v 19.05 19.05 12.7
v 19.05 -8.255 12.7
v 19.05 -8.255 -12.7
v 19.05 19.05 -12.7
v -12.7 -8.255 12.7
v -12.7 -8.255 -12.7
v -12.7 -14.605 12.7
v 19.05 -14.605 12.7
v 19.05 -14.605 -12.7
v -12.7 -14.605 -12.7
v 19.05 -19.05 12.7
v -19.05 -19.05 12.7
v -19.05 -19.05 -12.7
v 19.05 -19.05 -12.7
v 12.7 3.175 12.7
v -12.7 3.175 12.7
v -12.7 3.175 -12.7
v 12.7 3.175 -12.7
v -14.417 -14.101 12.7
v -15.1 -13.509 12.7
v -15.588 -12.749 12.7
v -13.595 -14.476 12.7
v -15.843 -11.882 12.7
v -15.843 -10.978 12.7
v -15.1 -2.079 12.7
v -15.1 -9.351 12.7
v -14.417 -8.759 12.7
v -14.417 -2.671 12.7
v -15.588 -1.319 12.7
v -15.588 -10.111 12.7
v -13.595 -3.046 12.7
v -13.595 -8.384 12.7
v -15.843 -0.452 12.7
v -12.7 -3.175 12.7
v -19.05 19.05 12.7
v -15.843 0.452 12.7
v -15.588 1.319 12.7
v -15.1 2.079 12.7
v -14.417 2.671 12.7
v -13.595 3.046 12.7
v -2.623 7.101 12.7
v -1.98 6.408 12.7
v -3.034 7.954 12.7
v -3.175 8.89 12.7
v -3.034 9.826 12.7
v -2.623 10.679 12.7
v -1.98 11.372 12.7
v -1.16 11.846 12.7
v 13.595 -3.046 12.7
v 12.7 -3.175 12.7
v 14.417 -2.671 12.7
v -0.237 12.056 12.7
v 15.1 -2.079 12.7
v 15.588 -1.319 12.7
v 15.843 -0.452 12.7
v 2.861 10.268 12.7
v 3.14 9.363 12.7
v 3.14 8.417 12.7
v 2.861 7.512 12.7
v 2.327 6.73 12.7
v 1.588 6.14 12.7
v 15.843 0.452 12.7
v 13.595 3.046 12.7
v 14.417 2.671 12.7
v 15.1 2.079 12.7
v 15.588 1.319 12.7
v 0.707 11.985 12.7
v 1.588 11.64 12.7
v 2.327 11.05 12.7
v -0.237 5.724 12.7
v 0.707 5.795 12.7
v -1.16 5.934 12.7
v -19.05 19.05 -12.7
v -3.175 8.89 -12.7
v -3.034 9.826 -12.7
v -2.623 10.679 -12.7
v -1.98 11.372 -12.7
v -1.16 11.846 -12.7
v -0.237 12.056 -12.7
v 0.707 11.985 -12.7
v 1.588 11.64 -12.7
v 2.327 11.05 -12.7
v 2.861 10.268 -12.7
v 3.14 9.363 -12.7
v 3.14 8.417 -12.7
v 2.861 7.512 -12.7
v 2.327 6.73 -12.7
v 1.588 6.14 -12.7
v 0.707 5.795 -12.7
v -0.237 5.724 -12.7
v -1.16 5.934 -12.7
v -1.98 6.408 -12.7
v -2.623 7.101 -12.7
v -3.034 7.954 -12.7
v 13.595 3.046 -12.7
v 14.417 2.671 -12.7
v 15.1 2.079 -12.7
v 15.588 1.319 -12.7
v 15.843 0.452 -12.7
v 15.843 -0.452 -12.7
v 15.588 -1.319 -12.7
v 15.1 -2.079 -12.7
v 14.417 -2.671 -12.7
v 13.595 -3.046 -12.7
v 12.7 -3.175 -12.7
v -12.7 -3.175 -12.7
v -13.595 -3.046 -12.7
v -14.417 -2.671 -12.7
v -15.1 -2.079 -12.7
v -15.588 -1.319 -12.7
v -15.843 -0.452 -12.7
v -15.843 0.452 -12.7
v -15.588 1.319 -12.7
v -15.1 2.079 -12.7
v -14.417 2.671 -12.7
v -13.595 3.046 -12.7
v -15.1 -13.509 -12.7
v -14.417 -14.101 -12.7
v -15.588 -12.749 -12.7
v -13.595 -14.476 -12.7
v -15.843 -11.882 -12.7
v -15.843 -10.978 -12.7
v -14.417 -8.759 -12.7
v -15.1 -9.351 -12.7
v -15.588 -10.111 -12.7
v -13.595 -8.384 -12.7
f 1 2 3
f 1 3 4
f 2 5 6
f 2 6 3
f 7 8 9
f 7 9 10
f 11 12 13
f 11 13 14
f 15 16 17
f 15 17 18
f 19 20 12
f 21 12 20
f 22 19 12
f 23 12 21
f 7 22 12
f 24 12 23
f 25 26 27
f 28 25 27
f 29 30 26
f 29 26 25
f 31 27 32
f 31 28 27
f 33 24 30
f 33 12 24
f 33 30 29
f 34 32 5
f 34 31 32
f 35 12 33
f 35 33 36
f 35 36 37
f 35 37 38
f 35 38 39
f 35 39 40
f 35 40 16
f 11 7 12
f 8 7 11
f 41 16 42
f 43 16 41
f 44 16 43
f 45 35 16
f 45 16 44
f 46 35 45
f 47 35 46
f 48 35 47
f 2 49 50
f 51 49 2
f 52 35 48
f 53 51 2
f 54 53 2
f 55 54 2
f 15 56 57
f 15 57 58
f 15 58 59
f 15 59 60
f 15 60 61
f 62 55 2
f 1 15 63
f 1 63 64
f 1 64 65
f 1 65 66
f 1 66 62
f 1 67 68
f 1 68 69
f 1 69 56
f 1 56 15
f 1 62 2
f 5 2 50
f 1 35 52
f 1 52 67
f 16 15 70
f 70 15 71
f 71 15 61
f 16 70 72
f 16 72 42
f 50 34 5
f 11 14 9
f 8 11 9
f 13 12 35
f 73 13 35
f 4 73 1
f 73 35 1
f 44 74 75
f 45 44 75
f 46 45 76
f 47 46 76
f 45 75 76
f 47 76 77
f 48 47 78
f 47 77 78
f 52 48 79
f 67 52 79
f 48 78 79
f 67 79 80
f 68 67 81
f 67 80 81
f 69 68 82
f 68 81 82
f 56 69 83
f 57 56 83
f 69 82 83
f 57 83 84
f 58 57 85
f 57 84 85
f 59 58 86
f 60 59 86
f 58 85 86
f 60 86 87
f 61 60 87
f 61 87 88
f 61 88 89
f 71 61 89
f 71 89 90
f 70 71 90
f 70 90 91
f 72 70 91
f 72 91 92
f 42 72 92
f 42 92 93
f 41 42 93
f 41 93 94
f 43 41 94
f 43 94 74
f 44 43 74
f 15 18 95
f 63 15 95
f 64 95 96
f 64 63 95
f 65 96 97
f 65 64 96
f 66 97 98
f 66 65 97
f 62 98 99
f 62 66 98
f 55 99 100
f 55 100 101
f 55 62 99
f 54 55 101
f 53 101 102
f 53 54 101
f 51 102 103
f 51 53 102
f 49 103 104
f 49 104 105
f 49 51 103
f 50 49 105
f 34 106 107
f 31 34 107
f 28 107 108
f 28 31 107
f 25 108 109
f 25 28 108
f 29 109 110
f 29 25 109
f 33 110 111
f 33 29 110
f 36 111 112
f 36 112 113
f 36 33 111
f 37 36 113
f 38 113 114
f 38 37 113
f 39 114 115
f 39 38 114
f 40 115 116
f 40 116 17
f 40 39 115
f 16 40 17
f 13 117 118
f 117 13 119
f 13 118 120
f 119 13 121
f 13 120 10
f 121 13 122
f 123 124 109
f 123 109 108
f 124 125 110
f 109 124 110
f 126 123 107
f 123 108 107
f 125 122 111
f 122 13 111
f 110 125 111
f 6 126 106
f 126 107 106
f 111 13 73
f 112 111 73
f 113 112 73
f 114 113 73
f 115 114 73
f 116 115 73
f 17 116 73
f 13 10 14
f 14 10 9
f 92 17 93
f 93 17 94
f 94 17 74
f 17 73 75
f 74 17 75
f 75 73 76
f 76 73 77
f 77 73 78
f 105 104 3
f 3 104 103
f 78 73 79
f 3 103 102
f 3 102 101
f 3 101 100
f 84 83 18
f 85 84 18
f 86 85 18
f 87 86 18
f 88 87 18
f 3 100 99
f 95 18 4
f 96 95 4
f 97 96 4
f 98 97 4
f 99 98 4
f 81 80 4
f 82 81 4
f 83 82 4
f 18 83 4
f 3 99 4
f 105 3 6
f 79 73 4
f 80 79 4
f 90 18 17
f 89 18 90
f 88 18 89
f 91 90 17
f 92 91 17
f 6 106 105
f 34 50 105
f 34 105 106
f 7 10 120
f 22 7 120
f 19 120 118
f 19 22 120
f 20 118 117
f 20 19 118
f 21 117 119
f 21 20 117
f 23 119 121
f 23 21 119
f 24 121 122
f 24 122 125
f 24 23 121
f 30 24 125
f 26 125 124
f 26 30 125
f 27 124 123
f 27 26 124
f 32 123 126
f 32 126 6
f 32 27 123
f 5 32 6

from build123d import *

# Parameters (mm, degrees)
SKETCH1_W                   = 38.1
SKETCH1_H                   = 38.1
BOSS_EXTRUDE1_DEPTH         = 12.7
CUT_EXTRUDE1_DEPTH          = 25.4
F_1_4_0_25_DIAMETER_HOLE1_D = 6.35
CUT_EXTRUDE2_DEPTH          = 25.4


with BuildPart() as part:
    # Sketch1 → Boss-Extrude1 (new, symmetric)
    with BuildSketch(Plane.XY):
        Rectangle(SKETCH1_W, SKETCH1_H)
    extrude(amount=BOSS_EXTRUDE1_DEPTH, both=True)

    # Sketch2 → Cut-Extrude1 (cut)
    with BuildSketch(Plane.XY.offset(12.7)):
        with BuildLine():
            Line((-12.7, -8.255), (19.05, -8.255))
            ThreePointArc((19.05, -8.255), (22.225, -11.43), (19.05, -14.605))
            Line((19.05, -14.605), (-12.7, -14.605))
            ThreePointArc((-12.7, -14.605), (-15.875, -11.43), (-12.7, -8.255))
        make_face()
    extrude(amount=-CUT_EXTRUDE1_DEPTH, mode=Mode.SUBTRACT)

    # 1/4 (0.25) Diameter Hole1 (through all)
    with Locations(Plane.XY.offset(12.7)):
        with Locations((0, 8.89)):
            Hole(F_1_4_0_25_DIAMETER_HOLE1_D / 2)

    # Sketch7 → Cut-Extrude2 (cut)
    with BuildSketch(Plane.XY.offset(12.7)):
        with BuildLine():
            Line((-12.7, 3.175), (12.7, 3.175))
            ThreePointArc((12.7, 3.175), (15.875, 0), (12.7, -3.175))
            Line((12.7, -3.175), (-12.7, -3.175))
            ThreePointArc((-12.7, -3.175), (-15.875, 0), (-12.7, 3.175))
        make_face()
    extrude(amount=-CUT_EXTRUDE2_DEPTH, mode=Mode.SUBTRACT)


solid = part.part
